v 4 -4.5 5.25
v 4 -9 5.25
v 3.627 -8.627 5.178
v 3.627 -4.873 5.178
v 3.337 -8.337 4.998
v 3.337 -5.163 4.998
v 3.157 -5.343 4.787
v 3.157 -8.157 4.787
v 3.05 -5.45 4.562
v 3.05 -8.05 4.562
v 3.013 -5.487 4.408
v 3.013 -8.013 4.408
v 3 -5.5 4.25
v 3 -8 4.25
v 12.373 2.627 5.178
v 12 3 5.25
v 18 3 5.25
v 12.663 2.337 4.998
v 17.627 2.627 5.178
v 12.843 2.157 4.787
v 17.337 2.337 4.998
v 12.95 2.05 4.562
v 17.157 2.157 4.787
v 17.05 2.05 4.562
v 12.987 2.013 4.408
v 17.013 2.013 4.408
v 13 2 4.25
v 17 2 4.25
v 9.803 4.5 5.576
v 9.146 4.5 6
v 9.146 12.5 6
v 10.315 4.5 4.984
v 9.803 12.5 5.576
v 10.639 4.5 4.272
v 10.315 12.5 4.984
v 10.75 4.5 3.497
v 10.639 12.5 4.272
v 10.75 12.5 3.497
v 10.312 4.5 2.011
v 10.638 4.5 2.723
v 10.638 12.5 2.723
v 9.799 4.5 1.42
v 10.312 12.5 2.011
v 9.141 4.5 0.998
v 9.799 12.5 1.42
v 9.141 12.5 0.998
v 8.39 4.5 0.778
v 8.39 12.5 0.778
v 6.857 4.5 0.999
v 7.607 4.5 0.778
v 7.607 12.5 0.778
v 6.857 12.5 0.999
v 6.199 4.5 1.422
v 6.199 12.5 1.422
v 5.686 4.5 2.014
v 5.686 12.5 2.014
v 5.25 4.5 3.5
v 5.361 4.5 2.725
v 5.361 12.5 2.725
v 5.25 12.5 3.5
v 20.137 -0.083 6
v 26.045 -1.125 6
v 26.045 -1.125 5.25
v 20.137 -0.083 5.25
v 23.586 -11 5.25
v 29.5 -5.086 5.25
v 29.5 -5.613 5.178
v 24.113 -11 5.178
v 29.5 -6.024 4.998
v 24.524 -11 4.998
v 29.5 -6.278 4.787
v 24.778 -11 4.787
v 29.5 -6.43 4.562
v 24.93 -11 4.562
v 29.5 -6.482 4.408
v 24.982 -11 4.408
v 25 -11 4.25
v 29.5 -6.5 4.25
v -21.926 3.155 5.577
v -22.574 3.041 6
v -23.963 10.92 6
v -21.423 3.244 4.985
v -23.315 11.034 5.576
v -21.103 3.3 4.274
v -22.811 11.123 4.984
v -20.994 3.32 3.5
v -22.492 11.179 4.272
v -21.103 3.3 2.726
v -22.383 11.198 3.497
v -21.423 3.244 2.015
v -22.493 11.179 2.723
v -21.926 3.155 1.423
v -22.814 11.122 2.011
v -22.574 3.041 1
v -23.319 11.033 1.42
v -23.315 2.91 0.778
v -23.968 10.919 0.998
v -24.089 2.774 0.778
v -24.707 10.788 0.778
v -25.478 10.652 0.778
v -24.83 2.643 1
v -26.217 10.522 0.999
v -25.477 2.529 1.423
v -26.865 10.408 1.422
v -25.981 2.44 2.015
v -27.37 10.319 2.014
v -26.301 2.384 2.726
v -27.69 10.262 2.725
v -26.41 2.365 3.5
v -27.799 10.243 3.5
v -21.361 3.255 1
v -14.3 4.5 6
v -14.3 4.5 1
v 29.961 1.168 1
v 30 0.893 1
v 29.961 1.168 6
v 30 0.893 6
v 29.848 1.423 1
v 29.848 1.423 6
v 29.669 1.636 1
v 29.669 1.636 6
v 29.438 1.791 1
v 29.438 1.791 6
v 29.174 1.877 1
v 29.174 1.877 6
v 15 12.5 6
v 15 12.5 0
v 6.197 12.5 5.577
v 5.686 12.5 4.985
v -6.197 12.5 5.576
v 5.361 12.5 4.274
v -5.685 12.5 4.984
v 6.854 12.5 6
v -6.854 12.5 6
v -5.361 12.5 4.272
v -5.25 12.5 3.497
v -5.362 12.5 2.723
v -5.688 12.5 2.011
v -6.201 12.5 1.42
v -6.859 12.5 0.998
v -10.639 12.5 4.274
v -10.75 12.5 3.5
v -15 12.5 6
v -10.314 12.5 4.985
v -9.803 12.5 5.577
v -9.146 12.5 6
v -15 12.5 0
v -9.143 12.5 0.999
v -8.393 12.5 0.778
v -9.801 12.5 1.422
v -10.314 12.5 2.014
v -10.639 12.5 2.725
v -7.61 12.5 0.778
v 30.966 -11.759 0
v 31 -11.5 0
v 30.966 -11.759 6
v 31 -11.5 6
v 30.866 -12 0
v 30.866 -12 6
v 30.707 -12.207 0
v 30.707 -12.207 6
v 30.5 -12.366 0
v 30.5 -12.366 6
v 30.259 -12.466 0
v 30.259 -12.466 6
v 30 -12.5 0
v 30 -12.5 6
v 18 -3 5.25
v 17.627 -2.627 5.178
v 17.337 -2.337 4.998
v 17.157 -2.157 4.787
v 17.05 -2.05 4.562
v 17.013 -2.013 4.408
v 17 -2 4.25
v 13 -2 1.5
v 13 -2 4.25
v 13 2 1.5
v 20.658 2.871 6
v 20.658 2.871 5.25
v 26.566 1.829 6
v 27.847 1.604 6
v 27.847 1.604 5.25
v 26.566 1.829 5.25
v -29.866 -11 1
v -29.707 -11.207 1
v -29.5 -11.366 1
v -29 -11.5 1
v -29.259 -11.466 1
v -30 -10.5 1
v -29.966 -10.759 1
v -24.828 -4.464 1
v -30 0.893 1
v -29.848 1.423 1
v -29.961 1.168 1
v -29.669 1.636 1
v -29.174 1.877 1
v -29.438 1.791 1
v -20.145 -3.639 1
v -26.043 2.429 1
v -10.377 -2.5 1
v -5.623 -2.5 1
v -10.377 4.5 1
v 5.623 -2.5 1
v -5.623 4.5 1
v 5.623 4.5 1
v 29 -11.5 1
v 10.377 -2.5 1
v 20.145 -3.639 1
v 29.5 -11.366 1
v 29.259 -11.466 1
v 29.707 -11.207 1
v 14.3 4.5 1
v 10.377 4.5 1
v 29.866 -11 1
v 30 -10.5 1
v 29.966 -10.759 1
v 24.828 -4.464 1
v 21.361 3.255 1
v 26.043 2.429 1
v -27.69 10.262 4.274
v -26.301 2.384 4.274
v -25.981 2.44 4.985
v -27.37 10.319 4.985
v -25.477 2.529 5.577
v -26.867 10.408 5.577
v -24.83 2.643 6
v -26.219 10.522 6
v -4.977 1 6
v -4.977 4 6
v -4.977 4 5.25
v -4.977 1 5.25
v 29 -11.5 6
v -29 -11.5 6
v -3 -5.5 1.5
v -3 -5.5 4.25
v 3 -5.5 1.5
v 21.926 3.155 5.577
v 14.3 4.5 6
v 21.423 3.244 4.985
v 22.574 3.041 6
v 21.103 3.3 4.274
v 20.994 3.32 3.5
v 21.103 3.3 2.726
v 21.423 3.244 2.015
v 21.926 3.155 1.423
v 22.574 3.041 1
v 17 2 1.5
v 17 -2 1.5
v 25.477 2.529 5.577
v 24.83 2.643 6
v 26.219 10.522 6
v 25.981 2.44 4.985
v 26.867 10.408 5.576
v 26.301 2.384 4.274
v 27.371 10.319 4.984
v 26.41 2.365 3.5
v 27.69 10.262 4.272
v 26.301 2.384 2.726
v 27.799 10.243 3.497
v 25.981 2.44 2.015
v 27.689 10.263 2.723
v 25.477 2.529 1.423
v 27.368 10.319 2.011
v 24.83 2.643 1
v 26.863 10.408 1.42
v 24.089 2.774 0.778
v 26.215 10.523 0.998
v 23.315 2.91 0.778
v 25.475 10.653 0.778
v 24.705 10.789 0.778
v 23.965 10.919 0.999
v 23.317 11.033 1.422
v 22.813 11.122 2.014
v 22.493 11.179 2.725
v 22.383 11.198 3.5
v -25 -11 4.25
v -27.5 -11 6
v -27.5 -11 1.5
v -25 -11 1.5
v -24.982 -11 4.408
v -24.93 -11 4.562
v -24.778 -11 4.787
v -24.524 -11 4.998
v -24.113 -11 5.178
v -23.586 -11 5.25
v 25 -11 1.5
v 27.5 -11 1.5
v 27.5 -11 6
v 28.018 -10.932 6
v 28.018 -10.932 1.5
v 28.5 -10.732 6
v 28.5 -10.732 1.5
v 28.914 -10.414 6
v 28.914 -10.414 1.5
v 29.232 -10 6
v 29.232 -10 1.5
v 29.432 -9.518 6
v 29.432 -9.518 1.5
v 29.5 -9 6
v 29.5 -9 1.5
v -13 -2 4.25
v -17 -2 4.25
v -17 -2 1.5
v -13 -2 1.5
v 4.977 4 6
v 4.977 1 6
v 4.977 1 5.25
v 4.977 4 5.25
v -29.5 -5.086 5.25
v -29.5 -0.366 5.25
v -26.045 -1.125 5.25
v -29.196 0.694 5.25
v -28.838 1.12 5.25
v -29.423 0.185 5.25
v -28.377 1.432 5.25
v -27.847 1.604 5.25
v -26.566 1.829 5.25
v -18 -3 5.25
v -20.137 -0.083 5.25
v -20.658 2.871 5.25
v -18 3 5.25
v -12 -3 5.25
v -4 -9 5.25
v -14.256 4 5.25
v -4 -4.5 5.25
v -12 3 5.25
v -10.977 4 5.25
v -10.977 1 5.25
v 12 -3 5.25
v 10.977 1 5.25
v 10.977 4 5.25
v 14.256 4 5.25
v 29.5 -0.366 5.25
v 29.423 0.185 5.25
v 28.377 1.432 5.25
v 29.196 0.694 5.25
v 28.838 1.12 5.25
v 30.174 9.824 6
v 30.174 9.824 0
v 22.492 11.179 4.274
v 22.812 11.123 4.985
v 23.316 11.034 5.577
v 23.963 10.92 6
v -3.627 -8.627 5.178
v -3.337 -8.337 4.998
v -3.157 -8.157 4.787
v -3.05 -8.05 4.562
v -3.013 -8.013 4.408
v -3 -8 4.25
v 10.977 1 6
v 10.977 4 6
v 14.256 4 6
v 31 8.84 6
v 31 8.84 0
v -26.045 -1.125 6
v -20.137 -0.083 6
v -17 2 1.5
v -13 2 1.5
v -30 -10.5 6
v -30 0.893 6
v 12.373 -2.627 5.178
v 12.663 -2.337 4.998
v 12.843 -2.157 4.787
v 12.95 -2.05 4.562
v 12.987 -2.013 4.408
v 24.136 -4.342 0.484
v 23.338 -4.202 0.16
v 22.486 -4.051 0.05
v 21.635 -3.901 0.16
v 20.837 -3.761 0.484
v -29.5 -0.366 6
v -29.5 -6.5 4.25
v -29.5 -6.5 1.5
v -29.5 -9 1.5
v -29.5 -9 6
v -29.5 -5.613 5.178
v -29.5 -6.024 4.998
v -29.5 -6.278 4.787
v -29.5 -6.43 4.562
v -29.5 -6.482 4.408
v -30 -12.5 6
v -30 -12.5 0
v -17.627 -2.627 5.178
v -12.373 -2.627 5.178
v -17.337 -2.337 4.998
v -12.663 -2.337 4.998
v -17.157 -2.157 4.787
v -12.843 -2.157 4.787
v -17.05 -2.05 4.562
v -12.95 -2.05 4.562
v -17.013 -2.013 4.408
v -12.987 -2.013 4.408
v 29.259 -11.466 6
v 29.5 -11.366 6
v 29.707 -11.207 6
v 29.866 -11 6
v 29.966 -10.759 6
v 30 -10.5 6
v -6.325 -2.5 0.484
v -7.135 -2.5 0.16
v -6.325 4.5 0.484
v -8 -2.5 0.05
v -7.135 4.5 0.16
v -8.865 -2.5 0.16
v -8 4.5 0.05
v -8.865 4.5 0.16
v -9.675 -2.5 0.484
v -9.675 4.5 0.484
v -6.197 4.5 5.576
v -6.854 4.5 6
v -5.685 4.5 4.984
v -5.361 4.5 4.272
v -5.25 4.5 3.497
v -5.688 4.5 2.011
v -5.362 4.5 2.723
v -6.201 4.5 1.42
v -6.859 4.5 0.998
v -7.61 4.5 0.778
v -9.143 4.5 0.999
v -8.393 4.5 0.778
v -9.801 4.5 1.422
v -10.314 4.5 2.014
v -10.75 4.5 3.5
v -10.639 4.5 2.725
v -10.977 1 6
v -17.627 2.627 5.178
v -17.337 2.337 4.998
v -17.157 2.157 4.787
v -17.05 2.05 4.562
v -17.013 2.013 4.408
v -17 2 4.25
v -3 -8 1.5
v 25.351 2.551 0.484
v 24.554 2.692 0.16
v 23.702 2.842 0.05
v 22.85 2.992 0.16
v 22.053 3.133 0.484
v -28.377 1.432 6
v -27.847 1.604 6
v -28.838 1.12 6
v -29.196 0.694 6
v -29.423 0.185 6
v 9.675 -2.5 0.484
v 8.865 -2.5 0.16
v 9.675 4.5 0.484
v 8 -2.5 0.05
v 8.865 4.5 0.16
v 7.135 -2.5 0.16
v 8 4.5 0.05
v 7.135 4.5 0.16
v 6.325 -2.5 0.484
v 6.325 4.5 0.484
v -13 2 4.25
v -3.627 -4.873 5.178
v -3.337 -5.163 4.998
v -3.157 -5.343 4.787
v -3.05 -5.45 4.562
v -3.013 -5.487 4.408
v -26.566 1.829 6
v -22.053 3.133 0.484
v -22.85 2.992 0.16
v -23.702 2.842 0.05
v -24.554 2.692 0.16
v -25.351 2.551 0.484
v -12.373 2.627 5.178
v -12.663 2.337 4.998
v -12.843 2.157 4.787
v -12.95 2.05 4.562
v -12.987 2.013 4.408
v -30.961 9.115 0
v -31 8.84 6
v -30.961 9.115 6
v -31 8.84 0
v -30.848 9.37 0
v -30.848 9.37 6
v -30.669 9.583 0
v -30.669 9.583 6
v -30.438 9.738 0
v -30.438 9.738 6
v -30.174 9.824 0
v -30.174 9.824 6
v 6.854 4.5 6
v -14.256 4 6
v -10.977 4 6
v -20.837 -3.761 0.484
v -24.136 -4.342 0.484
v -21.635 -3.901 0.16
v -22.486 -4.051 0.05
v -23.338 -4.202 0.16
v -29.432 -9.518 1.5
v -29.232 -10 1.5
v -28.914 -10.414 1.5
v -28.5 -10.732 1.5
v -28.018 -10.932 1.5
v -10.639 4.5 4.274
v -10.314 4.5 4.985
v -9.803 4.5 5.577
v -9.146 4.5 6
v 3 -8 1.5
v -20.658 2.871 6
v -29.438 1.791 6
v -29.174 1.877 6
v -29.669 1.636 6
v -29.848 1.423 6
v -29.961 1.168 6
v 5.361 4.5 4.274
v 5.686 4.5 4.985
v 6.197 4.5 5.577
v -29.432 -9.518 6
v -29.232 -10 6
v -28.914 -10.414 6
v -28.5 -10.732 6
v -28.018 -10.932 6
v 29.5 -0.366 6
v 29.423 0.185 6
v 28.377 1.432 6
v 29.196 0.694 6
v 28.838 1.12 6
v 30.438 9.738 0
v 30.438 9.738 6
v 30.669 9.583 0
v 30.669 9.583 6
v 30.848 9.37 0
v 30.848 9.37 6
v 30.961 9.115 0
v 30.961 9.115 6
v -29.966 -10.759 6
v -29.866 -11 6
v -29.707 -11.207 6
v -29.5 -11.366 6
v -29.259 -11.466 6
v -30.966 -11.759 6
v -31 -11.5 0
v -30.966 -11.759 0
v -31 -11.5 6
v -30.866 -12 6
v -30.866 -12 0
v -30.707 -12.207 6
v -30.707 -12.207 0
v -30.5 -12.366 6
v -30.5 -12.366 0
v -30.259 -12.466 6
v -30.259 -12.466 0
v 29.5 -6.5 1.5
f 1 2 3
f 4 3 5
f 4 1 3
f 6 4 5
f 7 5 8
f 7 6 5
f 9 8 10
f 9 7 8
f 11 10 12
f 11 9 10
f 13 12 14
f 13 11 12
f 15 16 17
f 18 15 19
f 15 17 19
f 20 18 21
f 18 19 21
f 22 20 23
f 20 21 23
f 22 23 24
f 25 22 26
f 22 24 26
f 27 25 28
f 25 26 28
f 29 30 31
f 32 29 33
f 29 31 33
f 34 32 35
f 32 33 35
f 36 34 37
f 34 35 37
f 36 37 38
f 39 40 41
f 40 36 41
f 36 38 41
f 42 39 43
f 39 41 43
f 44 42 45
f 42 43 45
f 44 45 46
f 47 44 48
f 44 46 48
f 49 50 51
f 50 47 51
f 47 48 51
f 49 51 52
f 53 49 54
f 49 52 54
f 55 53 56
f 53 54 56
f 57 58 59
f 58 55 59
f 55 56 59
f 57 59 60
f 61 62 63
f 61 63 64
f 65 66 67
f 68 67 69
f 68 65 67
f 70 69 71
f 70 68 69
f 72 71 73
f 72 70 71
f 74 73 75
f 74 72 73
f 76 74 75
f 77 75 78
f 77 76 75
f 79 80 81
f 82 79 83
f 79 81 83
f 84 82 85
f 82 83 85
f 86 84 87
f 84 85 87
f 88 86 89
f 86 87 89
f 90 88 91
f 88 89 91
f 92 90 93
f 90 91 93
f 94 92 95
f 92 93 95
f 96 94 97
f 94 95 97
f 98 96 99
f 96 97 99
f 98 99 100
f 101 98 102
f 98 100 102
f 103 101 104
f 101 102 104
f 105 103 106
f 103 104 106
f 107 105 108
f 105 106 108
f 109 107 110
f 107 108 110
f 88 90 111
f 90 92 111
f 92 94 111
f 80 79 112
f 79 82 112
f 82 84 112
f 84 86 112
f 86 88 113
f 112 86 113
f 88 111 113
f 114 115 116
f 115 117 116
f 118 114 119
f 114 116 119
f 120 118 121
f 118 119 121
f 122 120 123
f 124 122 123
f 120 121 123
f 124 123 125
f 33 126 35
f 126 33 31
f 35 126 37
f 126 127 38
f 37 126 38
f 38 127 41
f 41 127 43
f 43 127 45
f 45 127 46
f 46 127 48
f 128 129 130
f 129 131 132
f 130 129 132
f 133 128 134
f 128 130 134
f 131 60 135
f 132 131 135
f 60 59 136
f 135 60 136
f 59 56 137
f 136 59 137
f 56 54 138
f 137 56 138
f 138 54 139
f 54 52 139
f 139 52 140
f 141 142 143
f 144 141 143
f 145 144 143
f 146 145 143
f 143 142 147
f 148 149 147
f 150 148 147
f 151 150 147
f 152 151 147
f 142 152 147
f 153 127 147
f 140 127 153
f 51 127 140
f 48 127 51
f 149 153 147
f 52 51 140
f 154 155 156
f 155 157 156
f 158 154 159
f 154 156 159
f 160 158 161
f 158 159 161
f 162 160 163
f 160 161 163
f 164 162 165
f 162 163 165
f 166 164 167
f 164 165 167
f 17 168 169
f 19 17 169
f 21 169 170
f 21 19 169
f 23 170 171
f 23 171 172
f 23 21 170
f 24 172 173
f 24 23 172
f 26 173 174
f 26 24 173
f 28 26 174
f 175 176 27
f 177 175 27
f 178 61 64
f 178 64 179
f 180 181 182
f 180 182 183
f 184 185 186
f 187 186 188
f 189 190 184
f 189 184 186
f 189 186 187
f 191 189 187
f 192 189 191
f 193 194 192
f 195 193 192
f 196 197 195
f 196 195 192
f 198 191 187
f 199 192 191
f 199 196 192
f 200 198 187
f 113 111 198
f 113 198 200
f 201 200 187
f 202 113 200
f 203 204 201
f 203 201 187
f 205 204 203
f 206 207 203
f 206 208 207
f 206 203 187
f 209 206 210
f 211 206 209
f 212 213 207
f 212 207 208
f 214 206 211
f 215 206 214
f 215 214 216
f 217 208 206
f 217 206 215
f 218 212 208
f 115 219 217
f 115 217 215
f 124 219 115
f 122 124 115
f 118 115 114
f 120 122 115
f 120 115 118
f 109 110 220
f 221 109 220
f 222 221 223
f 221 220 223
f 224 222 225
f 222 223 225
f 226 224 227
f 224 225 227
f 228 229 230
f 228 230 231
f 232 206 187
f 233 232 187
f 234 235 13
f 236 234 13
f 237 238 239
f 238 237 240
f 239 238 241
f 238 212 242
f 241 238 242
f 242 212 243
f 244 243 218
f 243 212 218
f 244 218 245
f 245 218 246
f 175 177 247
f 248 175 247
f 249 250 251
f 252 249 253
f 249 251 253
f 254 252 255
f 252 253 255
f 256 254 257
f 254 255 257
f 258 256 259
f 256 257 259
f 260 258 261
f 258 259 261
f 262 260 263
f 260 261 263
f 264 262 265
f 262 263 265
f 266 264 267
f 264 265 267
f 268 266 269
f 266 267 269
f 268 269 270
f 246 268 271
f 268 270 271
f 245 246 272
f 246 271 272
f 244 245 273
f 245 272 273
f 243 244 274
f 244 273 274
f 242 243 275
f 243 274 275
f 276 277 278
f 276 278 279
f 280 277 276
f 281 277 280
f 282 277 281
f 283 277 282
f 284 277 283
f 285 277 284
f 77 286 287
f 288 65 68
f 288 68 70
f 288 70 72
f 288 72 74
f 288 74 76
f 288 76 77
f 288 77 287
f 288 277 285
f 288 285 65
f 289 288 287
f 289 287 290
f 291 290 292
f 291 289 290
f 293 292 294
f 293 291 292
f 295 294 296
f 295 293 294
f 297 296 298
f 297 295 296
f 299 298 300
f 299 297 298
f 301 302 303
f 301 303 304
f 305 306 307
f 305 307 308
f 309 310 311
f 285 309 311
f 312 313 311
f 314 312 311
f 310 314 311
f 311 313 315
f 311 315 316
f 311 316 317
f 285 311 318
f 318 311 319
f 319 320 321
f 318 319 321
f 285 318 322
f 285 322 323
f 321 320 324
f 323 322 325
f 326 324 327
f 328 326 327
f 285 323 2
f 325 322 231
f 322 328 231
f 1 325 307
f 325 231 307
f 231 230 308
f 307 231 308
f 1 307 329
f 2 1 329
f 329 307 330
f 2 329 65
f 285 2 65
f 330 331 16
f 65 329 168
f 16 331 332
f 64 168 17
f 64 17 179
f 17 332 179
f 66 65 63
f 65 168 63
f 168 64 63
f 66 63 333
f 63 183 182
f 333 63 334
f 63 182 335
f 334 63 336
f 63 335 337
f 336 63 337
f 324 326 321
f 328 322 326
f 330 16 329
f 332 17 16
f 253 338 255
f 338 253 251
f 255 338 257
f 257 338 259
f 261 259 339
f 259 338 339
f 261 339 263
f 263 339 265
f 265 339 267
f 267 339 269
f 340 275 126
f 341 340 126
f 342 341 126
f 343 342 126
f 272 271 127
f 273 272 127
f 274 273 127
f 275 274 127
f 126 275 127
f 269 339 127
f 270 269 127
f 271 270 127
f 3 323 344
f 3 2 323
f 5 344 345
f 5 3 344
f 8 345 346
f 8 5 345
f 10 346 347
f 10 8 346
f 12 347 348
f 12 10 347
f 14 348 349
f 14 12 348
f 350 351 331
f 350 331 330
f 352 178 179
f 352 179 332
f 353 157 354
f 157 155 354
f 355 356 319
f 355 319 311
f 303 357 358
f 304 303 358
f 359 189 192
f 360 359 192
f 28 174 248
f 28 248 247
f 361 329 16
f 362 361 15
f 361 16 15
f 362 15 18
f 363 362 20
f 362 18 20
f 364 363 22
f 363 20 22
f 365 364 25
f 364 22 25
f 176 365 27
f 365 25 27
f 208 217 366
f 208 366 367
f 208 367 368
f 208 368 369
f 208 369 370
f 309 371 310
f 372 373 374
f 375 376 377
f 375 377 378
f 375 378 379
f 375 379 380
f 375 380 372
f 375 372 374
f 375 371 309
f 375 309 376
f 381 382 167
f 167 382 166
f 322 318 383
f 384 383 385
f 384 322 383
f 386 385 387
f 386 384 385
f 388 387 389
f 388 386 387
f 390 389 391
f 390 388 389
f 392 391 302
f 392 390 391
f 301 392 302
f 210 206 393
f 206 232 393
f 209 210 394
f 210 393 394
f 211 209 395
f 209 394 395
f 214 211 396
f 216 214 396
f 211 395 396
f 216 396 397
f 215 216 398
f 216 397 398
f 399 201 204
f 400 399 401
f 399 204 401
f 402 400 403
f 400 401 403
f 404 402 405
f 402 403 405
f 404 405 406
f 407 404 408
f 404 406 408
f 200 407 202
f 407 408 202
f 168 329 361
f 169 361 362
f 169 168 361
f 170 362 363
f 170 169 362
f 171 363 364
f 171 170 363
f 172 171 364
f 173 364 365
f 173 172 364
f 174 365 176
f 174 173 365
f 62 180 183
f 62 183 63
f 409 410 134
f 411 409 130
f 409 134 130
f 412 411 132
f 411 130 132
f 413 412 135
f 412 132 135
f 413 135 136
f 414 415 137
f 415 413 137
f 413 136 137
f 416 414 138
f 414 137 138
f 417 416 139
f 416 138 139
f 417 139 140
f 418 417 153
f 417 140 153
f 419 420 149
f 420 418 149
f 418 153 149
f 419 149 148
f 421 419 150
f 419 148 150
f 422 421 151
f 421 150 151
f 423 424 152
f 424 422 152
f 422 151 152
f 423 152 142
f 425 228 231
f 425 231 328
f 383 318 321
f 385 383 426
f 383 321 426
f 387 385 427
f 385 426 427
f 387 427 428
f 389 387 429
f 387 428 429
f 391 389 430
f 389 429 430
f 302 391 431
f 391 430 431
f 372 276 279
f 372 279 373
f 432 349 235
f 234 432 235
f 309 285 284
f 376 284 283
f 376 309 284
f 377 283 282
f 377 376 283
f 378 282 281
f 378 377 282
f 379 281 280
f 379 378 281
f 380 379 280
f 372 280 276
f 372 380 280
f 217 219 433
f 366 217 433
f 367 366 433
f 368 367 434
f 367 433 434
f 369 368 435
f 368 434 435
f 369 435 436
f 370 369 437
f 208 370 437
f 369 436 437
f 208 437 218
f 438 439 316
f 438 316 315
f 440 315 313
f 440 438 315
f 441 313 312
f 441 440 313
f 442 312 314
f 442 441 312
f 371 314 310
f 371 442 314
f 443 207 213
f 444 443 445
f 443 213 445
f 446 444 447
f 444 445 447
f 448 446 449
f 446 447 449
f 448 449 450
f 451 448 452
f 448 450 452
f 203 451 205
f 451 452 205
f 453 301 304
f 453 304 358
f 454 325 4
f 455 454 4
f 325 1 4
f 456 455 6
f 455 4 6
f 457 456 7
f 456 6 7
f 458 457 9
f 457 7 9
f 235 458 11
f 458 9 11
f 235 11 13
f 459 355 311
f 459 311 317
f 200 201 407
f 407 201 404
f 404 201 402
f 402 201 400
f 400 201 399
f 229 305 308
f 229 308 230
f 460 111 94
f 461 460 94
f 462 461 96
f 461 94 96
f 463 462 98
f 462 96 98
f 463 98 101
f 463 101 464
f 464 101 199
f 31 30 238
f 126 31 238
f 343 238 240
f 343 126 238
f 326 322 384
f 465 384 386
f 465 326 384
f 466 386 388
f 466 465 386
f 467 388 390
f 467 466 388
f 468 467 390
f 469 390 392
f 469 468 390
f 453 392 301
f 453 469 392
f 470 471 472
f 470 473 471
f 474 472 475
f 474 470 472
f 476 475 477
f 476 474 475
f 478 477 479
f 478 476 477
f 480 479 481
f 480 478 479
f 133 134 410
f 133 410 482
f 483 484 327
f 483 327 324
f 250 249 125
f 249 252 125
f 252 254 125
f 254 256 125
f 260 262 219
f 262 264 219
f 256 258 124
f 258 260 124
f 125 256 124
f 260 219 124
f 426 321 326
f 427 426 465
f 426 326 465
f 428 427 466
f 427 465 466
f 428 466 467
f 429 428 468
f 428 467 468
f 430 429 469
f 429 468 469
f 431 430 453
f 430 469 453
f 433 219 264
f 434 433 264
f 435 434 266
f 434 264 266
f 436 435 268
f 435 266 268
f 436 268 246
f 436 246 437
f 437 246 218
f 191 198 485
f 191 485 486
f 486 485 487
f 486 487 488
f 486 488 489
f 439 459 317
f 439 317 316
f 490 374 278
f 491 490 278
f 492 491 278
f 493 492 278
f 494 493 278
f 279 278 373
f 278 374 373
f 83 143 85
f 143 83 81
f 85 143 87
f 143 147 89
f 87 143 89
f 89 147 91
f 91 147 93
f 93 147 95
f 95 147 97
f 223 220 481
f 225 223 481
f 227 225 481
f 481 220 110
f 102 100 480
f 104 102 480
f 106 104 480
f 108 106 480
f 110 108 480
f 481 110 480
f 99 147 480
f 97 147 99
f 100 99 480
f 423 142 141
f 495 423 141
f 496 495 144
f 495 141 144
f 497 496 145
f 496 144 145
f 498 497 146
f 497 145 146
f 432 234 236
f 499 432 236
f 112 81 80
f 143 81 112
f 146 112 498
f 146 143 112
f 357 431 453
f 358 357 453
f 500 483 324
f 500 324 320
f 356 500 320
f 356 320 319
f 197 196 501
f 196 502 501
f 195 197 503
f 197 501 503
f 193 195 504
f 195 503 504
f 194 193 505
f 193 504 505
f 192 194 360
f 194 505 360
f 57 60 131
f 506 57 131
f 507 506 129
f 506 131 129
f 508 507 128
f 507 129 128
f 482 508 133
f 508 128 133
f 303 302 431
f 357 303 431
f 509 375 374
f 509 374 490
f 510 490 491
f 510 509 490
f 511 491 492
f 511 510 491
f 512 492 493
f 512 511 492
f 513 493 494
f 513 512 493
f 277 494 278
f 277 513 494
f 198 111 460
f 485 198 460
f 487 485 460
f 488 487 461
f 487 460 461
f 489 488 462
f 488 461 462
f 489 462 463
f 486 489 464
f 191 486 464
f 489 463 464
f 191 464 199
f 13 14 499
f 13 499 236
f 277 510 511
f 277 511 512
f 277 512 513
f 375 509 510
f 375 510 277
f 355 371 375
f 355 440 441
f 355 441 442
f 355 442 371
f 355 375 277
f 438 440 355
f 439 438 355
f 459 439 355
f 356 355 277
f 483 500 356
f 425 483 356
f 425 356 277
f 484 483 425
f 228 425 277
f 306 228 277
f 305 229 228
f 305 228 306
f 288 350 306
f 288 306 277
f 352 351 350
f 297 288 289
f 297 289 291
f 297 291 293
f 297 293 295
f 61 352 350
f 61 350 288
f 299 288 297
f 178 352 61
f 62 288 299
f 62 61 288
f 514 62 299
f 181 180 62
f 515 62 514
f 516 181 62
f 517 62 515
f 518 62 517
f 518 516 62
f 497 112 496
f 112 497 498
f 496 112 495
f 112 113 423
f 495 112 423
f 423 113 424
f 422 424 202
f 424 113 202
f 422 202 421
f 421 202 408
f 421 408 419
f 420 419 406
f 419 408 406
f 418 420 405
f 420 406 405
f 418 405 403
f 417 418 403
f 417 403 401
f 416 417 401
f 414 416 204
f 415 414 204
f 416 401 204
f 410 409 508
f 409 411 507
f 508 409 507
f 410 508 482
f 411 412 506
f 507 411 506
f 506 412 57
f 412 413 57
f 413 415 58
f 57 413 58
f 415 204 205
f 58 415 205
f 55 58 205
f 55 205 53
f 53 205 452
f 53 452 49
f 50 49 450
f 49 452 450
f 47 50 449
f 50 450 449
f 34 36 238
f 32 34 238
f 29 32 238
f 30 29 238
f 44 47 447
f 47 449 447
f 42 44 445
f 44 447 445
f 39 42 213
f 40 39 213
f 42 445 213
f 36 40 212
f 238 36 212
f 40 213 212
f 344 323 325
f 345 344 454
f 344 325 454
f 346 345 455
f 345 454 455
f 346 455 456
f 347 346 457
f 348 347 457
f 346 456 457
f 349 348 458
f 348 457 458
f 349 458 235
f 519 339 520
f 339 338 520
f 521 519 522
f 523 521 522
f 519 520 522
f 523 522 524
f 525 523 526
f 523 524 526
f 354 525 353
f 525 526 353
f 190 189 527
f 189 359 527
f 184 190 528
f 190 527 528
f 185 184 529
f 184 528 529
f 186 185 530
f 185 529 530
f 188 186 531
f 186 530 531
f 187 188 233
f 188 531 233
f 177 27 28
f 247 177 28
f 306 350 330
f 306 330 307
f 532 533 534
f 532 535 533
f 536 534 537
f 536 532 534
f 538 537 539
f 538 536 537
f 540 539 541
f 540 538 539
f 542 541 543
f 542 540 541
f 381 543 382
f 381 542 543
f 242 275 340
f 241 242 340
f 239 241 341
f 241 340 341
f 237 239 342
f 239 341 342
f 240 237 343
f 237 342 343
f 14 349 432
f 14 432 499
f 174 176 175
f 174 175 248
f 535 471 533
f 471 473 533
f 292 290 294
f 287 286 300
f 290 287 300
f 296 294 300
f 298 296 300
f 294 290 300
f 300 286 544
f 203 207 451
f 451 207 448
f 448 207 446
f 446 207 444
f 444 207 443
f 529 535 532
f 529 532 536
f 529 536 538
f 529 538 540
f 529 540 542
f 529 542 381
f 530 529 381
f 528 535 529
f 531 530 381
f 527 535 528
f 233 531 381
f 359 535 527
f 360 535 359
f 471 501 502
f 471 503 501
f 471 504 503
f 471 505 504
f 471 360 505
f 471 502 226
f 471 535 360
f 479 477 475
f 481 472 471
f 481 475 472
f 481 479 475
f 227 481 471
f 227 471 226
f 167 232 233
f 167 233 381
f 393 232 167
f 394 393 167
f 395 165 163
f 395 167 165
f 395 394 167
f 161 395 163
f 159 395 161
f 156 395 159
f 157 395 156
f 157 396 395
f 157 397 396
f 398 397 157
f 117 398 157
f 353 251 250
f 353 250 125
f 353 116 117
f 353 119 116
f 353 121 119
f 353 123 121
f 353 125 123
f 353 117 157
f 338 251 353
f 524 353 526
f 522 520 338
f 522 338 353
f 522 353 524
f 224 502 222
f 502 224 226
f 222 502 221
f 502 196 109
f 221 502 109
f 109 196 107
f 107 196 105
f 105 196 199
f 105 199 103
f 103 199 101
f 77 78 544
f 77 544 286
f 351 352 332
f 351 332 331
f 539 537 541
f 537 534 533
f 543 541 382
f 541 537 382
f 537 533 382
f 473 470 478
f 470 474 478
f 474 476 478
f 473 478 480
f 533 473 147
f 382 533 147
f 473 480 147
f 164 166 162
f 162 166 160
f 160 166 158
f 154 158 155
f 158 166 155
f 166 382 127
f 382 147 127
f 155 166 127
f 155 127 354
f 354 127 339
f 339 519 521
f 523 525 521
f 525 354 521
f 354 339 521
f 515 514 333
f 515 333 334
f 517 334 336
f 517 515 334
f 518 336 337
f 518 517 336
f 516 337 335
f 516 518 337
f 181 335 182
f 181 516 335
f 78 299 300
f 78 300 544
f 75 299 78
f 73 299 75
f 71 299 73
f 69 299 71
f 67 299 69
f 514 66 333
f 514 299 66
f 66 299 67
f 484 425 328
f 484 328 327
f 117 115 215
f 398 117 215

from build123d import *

# Parameters (mm, degrees)
F1_DEPTH  = 1
F2_DEPTH  = 6
F4_DEPTH  = 8
F6_DEPTH  = 8
F8_DEPTH  = 8
F9_START  = -8
F9_DEPTH  = 7
F10_START = -8
F10_DEPTH = 7
F11_START = -8
F11_DEPTH = 7
F12_START = -8
F12_DEPTH = 7
F14_START = -8
F14_DEPTH = 7
F15_START = -8
F15_DEPTH = 7
F16_R     = 1
F18_W     = 6
F18_H     = 2.5
F18_W_2   = 4
F18_H_2   = 4
F19_DEPTH = 0.75
F20_DEPTH = 4.5
F21_R     = 1


with BuildPart() as f1:
    # F0 (on Top) → F1 (new body)
    with BuildSketch(Plane.XY):
        Polygon((-31, 9.6787683087), (-31, 1.5553554136), (-30, 1.7316823943), (-14.3000906918, 4.5), (0, 4.5), (14.3000906918, 4.5), (30, 1.7316823943), (31, 1.5553554136), (31, 9.6787683087), (15, 12.5), (0, 12.5), (-15, 12.5), align=None)
        Polygon((-31, 1.5553554136), (-31, -12.5), (31, -12.5), (31, 1.5553554136), (30, 1.7316823943), (30, -11.5), (-30, -11.5), (-30, 1.7316823943), align=None)
        Polygon((-14.3000906918, 4.5), (-30, 1.7316823943), (-30, -11.5), (30, -11.5), (30, 1.7316823943), (14.3000906918, 4.5), (0, 4.5), align=None)
    extrude(amount=F1_DEPTH)

    # F0 (on Top) → F2 (join)
    with BuildSketch(Plane.XY):
        Polygon((-31, 9.6787683087), (-31, 1.5553554136), (-30, 1.7316823943), (-14.3000906918, 4.5), (0, 4.5), (14.3000906918, 4.5), (30, 1.7316823943), (31, 1.5553554136), (31, 9.6787683087), (15, 12.5), (0, 12.5), (-15, 12.5), align=None)
        Polygon((-31, 1.5553554136), (-31, -12.5), (31, -12.5), (31, 1.5553554136), (30, 1.7316823943), (30, -11.5), (-30, -11.5), (-30, 1.7316823943), align=None)
    extrude(amount=F2_DEPTH)

    # F3 (on face) → F4 (cut)
    with BuildSketch(Plane(origin=(0, 12.5, 0), x_dir=(-1, 0, 0), z_dir=(0, 1, 0))):
        with BuildLine():
            ThreePointArc((-9.1456439237, 6), (-9.4852574204, 1.185586382), (-5.25, 3.5))
            ThreePointArc((-5.25, 3.5), (-5.685586382, 4.9852574204), (-6.8543560763, 6))
            Line((-6.8543560763, 6), (-9.1456439237, 6))
        make_face()
        with BuildLine():
            Line((9.1456439237, 6), (6.8543560763, 6))
            ThreePointArc((6.8543560763, 6), (6.5147425796, 1.185586382), (10.75, 3.5))
            ThreePointArc((10.75, 3.5), (10.314413618, 4.9852574204), (9.1456439237, 6))
        make_face()
        with BuildLine():
            ThreePointArc((9.1456439237, 6), (8, 6.25), (6.8543560763, 6))
            Line((6.8543560763, 6), (9.1456439237, 6))
        make_face()
    extrude(amount=-F4_DEPTH, mode=Mode.SUBTRACT)

    # F5 (on face) → F6 (cut)
    with BuildSketch(Plane(origin=(2.5899312399, 14.6882299549, 0), x_dir=(-0.984807753, 0.1736481777, 0), z_dir=(0.1736481777, 0.984807753, 0))):
        with BuildLine():
            Line((-23.9939837883, 6), (-21.7026959408, 6))
            ThreePointArc((-21.7026959408, 6), (-22.8483398645, 6.25), (-23.9939837883, 6))
        make_face()
        with BuildLine():
            ThreePointArc((-23.9939837883, 6), (-24.3335972849, 1.185586382), (-20.0983398645, 3.5))
            ThreePointArc((-20.0983398645, 3.5), (-20.5339262465, 4.9852574204), (-21.7026959408, 6))
            Line((-21.7026959408, 6), (-23.9939837883, 6))
        make_face()
    extrude(amount=-F6_DEPTH, mode=Mode.SUBTRACT)

    # F7 (on face) → F8 (cut)
    with BuildSketch(Plane(origin=(-2.5899312399, 14.6882299549, 0), x_dir=(-0.984807753, -0.1736481777, 0), z_dir=(-0.1736481777, 0.984807753, 0))):
        with BuildLine():
            ThreePointArc((21.7026959408, 6), (21.3630824441, 1.185586382), (25.5983398645, 3.5))
            ThreePointArc((25.5983398645, 3.5), (25.1627534825, 4.9852574204), (23.9939837883, 6))
            Line((23.9939837883, 6), (21.7026959408, 6))
        make_face()
    extrude(amount=-F8_DEPTH, mode=Mode.SUBTRACT)

    # F5 (on face) → F12 (cut)
    with BuildSketch(Plane(origin=(2.5899312399, 14.6882299549, 0), x_dir=(-0.984807753, 0.1736481777, 0), z_dir=(0.1736481777, 0.984807753, 0)).offset(F12_START)):
        with BuildLine():
            ThreePointArc((-21.7026959408, 6), (-20.5339262465, 4.9852574204), (-20.0983398645, 3.5))
            ThreePointArc((-20.0983398645, 3.5), (-24.3335972849, 1.185586382), (-23.9939837883, 6))
            Line((-23.9939837883, 6), (-25.2258385501, 6))
            ThreePointArc((-25.2258385501, 6), (-24.2085107241, 0.3294424414), (-19.3983398645, 3.5))
            ThreePointArc((-19.3983398645, 3.5), (-19.6777823059, 4.8601708596), (-20.4708411789, 6))
            Line((-20.4708411789, 6), (-21.7026959408, 6))
        make_face()
        with BuildLine():
            ThreePointArc((-23.9939837883, 6), (-24.3335972849, 1.185586382), (-20.0983398645, 3.5))
            ThreePointArc((-20.0983398645, 3.5), (-20.5339262465, 4.9852574204), (-21.7026959408, 6))
            Line((-21.7026959408, 6), (-23.9939837883, 6))
        make_face()
    extrude(amount=-F12_DEPTH, mode=Mode.SUBTRACT)

    # F3 (on face) → F14 (cut)
    with BuildSketch(Plane(origin=(0, 12.5, 0), x_dir=(-1, 0, 0), z_dir=(0, 1, 0)).offset(F14_START)):
        with BuildLine():
            ThreePointArc((-6.8543560763, 6), (-5.685586382, 4.9852574204), (-5.25, 3.5))
            ThreePointArc((-5.25, 3.5), (-9.4852574204, 1.185586382), (-9.1456439237, 6))
            Line((-9.1456439237, 6), (-10.3774986856, 6))
            ThreePointArc((-10.3774986856, 6), (-9.3601708596, 0.3294424414), (-4.55, 3.5))
            ThreePointArc((-4.55, 3.5), (-4.8294424414, 4.8601708596), (-5.6225013144, 6))
            Line((-5.6225013144, 6), (-6.8543560763, 6))
        make_face()
        with BuildLine():
            ThreePointArc((-9.1456439237, 6), (-9.4852574204, 1.185586382), (-5.25, 3.5))
            ThreePointArc((-5.25, 3.5), (-5.685586382, 4.9852574204), (-6.8543560763, 6))
            Line((-6.8543560763, 6), (-9.1456439237, 6))
        make_face()
        with BuildLine():
            Line((6.8543560763, 6), (5.6225013144, 6))
            ThreePointArc((5.6225013144, 6), (6.6398291404, 0.3294424414), (11.45, 3.5))
            ThreePointArc((11.45, 3.5), (11.1705575586, 4.8601708596), (10.3774986856, 6))
            Line((10.3774986856, 6), (9.1456439237, 6))
            ThreePointArc((9.1456439237, 6), (10.314413618, 4.9852574204), (10.75, 3.5))
            ThreePointArc((10.75, 3.5), (6.5147425796, 1.185586382), (6.8543560763, 6))
        make_face()
        with BuildLine():
            Line((9.1456439237, 6), (6.8543560763, 6))
            ThreePointArc((6.8543560763, 6), (6.5147425796, 1.185586382), (10.75, 3.5))
            ThreePointArc((10.75, 3.5), (10.314413618, 4.9852574204), (9.1456439237, 6))
        make_face()
    extrude(amount=-F14_DEPTH, mode=Mode.SUBTRACT)

    # F7 (on face) → F15 (cut)
    with BuildSketch(Plane(origin=(-2.5899312399, 14.6882299549, 0), x_dir=(-0.984807753, -0.1736481777, 0), z_dir=(-0.1736481777, 0.984807753, 0)).offset(F15_START)):
        with BuildLine():
            ThreePointArc((23.9939837883, 6), (25.1627534825, 4.9852574204), (25.5983398645, 3.5))
            ThreePointArc((25.5983398645, 3.5), (21.3630824441, 1.185586382), (21.7026959408, 6))
            Line((21.7026959408, 6), (20.4708411789, 6))
            ThreePointArc((20.4708411789, 6), (21.4881690049, 0.3294424414), (26.2983398645, 3.5))
            ThreePointArc((26.2983398645, 3.5), (26.0188974232, 4.8601708596), (25.2258385501, 6))
            Line((25.2258385501, 6), (23.9939837883, 6))
        make_face()
        with BuildLine():
            ThreePointArc((21.7026959408, 6), (21.3630824441, 1.185586382), (25.5983398645, 3.5))
            ThreePointArc((25.5983398645, 3.5), (25.1627534825, 4.9852574204), (23.9939837883, 6))
            Line((23.9939837883, 6), (21.7026959408, 6))
        make_face()
    extrude(amount=-F15_DEPTH, mode=Mode.SUBTRACT)

    # F16
    f16_edges = [f1.edges().sort_by_distance(p)[0] for p in [
        (31, 9.678768, 3),
        (-31, 9.678768, 3),
        (-31, -12.5, 3),
        (-30, -11.5, 3.5),
        (30, -11.5, 3.5),
        (31, -12.5, 3),
        (30, 1.731682, 3.5),
        (-30, 1.731682, 3.5),
    ]]
    fillet(f16_edges, radius=F16_R)


with BuildPart() as f9:
    # F5 (on face) → F9 (new body)
    with BuildSketch(Plane(origin=(2.5899312399, 14.6882299549, 0), x_dir=(-0.984807753, 0.1736481777, 0), z_dir=(0.1736481777, 0.984807753, 0)).offset(F9_START)):
        with BuildLine():
            Line((-23.9939837883, 6), (-21.7026959408, 6))
            ThreePointArc((-21.7026959408, 6), (-22.8483398645, 6.25), (-23.9939837883, 6))
        make_face()
        with BuildLine():
            ThreePointArc((-23.9939837883, 6), (-22.8483398645, 6.25), (-21.7026959408, 6))
            Line((-21.7026959408, 6), (-20.4708411789, 6))
            ThreePointArc((-20.4708411789, 6), (-22.8483398645, 6.95), (-25.2258385501, 6))
            Line((-25.2258385501, 6), (-23.9939837883, 6))
        make_face()
    extrude(amount=-F9_DEPTH)


with BuildPart() as f10:
    # F3 (on face) → F10 (new body)
    with BuildSketch(Plane(origin=(0, 12.5, 0), x_dir=(-1, 0, 0), z_dir=(0, 1, 0)).offset(F10_START)):
        with BuildLine():
            ThreePointArc((-6.8543560763, 6), (-5.685586382, 4.9852574204), (-5.25, 3.5))
            ThreePointArc((-5.25, 3.5), (-9.4852574204, 1.185586382), (-9.1456439237, 6))
            Line((-9.1456439237, 6), (-10.3774986856, 6))
            ThreePointArc((-10.3774986856, 6), (-9.3601708596, 0.3294424414), (-4.55, 3.5))
            ThreePointArc((-4.55, 3.5), (-4.8294424414, 4.8601708596), (-5.6225013144, 6))
            Line((-5.6225013144, 6), (-6.8543560763, 6))
        make_face()
        with BuildLine():
            ThreePointArc((-9.1456439237, 6), (-9.4852574204, 1.185586382), (-5.25, 3.5))
            ThreePointArc((-5.25, 3.5), (-5.685586382, 4.9852574204), (-6.8543560763, 6))
            Line((-6.8543560763, 6), (-9.1456439237, 6))
        make_face()
    extrude(amount=-F10_DEPTH)


with BuildPart() as f10b:
    # F3 (on face) → F10, piece 2 (new body)
    with BuildSketch(Plane(origin=(0, 12.5, 0), x_dir=(-1, 0, 0), z_dir=(0, 1, 0)).offset(F10_START)):
        with BuildLine():
            ThreePointArc((10.3774986856, 6), (8, 6.95), (5.6225013144, 6))
            Line((5.6225013144, 6), (6.8543560763, 6))
            ThreePointArc((6.8543560763, 6), (8, 6.25), (9.1456439237, 6))
            Line((9.1456439237, 6), (10.3774986856, 6))
        make_face()
        with BuildLine():
            ThreePointArc((9.1456439237, 6), (8, 6.25), (6.8543560763, 6))
            Line((6.8543560763, 6), (9.1456439237, 6))
        make_face()
    extrude(amount=-F10_DEPTH)


with BuildPart() as f11:
    # F7 (on face) → F11 (new body)
    with BuildSketch(Plane(origin=(-2.5899312399, 14.6882299549, 0), x_dir=(-0.984807753, -0.1736481777, 0), z_dir=(-0.1736481777, 0.984807753, 0)).offset(F11_START)):
        with BuildLine():
            ThreePointArc((23.9939837883, 6), (25.1627534825, 4.9852574204), (25.5983398645, 3.5))
            ThreePointArc((25.5983398645, 3.5), (21.3630824441, 1.185586382), (21.7026959408, 6))
            Line((21.7026959408, 6), (20.4708411789, 6))
            ThreePointArc((20.4708411789, 6), (21.4881690049, 0.3294424414), (26.2983398645, 3.5))
            ThreePointArc((26.2983398645, 3.5), (26.0188974232, 4.8601708596), (25.2258385501, 6))
            Line((25.2258385501, 6), (23.9939837883, 6))
        make_face()
        with BuildLine():
            ThreePointArc((21.7026959408, 6), (21.3630824441, 1.185586382), (25.5983398645, 3.5))
            ThreePointArc((25.5983398645, 3.5), (25.1627534825, 4.9852574204), (23.9939837883, 6))
            Line((23.9939837883, 6), (21.7026959408, 6))
        make_face()
    extrude(amount=-F11_DEPTH)


with BuildPart() as f19:
    # F18 (on offset) → F19 (new body)
    with BuildSketch(Plane.XY.offset(6)):
        with BuildLine():
            ThreePointArc((-29.5, -9), (-28.9142135624, -10.4142135624), (-27.5, -11))
            Line((-27.5, -11), (-25, -11))
            Line((-25, -11), (-29.5, -6.5))
            Line((-29.5, -6.5), (-29.5, -9))
        make_face()
        with BuildLine():
            Line((-29.5, -6.5), (-25, -11))
            Line((-25, -11), (25, -11))
            Line((25, -11), (29.5, -6.5))
            Line((29.5, -6.5), (29.5, -0.3660666837))
            ThreePointArc((29.5, -0.3660666837), (29.0320888862, 0.9195085357), (27.8472963553, 1.6035488224))
            Line((27.8472963553, 1.6035488224), (26.5664432727, 1.8293977792))
            Line((26.5664432727, 1.8293977792), (26.0454987397, -1.1250254799))
            Line((26.0454987397, -1.1250254799), (20.1366522216, -0.0831364139))
            Line((20.1366522216, -0.0831364139), (20.6575967546, 2.8712868452))
            Line((20.6575967546, 2.8712868452), (14.25634636, 4))
            Line((14.25634636, 4), (10.9774986856, 4))
            Line((10.9774986856, 4), (10.9774986856, 1))
            Line((10.9774986856, 1), (4.9774986856, 1))
            Line((4.9774986856, 1), (4.9774986856, 4))
            Line((4.9774986856, 4), (-4.9774986856, 4))
            Line((-4.9774986856, 4), (-4.9774986856, 1))
            Line((-4.9774986856, 1), (-10.9774986856, 1))
            Line((-10.9774986856, 1), (-10.9774986856, 4))
            Line((-10.9774986856, 4), (-14.25634636, 4))
            Line((-14.25634636, 4), (-20.6575967546, 2.8712868452))
            Line((-20.6575967546, 2.8712868452), (-20.1366522216, -0.0831364139))
            Line((-20.1366522216, -0.0831364139), (-26.0454987397, -1.1250254799))
            Line((-26.0454987397, -1.1250254799), (-26.5664432727, 1.8293977792))
            Line((-26.5664432727, 1.8293977792), (-27.8472963553, 1.6035488224))
            ThreePointArc((-27.8472963553, 1.6035488224), (-29.0320888862, 0.9195085357), (-29.5, -0.3660666837))
            Line((-29.5, -0.3660666837), (-29.5, -6.5))
        make_face()
        with Locations((0, -6.75)):
            Rectangle(F18_W, F18_H, mode=Mode.SUBTRACT)
        with Locations((-15, 0)):
            Rectangle(F18_W_2, F18_H_2, mode=Mode.SUBTRACT)
        with Locations((15, 0)):
            Rectangle(F18_W_2, F18_H_2, mode=Mode.SUBTRACT)
        with BuildLine():
            Line((29.5, -6.5), (25, -11))
            Line((25, -11), (27.5, -11))
            ThreePointArc((27.5, -11), (28.9142135624, -10.4142135624), (29.5, -9))
            Line((29.5, -9), (29.5, -6.5))
        make_face()
        with Locations((-15, 0)):
            Rectangle(F18_W_2, F18_H_2)
        with Locations((0, -6.75)):
            Rectangle(F18_W, F18_H)
        with Locations((15, 0)):
            Rectangle(F18_W_2, F18_H_2)
    extrude(amount=-F19_DEPTH)

    # F18 (on offset) → F20 (join)
    with BuildSketch(Plane.XY.offset(6)):
        with Locations((0, -6.75)):
            Rectangle(F18_W, F18_H)
        with Locations((-15, 0)):
            Rectangle(F18_W_2, F18_H_2)
        with BuildLine():
            ThreePointArc((-29.5, -9), (-28.9142135624, -10.4142135624), (-27.5, -11))
            Line((-27.5, -11), (-25, -11))
            Line((-25, -11), (-29.5, -6.5))
            Line((-29.5, -6.5), (-29.5, -9))
        make_face()
        with Locations((15, 0)):
            Rectangle(F18_W_2, F18_H_2)
        with BuildLine():
            Line((29.5, -6.5), (25, -11))
            Line((25, -11), (27.5, -11))
            ThreePointArc((27.5, -11), (28.9142135624, -10.4142135624), (29.5, -9))
            Line((29.5, -9), (29.5, -6.5))
        make_face()
    extrude(amount=-F20_DEPTH)

    # F21
    f21_edges = [f19.edges().sort_by_distance(p)[0] for p in [
        (0, -8, 5.25),
        (3, -6.75, 5.25),
        (-3, -6.75, 5.25),
        (0, -5.5, 5.25),
        (-15, -2, 5.25),
        (-17, 0, 5.25),
        (-15, 2, 5.25),
        (-13, 0, 5.25),
        (-27.25, -8.75, 5.25),
        (15, -2, 5.25),
        (13, 0, 5.25),
        (27.25, -8.75, 5.25),
        (17, 0, 5.25),
        (15, 2, 5.25),
    ]]
    fillet(f21_edges, radius=F21_R)


solid = Compound([f1.part, f19.part])
